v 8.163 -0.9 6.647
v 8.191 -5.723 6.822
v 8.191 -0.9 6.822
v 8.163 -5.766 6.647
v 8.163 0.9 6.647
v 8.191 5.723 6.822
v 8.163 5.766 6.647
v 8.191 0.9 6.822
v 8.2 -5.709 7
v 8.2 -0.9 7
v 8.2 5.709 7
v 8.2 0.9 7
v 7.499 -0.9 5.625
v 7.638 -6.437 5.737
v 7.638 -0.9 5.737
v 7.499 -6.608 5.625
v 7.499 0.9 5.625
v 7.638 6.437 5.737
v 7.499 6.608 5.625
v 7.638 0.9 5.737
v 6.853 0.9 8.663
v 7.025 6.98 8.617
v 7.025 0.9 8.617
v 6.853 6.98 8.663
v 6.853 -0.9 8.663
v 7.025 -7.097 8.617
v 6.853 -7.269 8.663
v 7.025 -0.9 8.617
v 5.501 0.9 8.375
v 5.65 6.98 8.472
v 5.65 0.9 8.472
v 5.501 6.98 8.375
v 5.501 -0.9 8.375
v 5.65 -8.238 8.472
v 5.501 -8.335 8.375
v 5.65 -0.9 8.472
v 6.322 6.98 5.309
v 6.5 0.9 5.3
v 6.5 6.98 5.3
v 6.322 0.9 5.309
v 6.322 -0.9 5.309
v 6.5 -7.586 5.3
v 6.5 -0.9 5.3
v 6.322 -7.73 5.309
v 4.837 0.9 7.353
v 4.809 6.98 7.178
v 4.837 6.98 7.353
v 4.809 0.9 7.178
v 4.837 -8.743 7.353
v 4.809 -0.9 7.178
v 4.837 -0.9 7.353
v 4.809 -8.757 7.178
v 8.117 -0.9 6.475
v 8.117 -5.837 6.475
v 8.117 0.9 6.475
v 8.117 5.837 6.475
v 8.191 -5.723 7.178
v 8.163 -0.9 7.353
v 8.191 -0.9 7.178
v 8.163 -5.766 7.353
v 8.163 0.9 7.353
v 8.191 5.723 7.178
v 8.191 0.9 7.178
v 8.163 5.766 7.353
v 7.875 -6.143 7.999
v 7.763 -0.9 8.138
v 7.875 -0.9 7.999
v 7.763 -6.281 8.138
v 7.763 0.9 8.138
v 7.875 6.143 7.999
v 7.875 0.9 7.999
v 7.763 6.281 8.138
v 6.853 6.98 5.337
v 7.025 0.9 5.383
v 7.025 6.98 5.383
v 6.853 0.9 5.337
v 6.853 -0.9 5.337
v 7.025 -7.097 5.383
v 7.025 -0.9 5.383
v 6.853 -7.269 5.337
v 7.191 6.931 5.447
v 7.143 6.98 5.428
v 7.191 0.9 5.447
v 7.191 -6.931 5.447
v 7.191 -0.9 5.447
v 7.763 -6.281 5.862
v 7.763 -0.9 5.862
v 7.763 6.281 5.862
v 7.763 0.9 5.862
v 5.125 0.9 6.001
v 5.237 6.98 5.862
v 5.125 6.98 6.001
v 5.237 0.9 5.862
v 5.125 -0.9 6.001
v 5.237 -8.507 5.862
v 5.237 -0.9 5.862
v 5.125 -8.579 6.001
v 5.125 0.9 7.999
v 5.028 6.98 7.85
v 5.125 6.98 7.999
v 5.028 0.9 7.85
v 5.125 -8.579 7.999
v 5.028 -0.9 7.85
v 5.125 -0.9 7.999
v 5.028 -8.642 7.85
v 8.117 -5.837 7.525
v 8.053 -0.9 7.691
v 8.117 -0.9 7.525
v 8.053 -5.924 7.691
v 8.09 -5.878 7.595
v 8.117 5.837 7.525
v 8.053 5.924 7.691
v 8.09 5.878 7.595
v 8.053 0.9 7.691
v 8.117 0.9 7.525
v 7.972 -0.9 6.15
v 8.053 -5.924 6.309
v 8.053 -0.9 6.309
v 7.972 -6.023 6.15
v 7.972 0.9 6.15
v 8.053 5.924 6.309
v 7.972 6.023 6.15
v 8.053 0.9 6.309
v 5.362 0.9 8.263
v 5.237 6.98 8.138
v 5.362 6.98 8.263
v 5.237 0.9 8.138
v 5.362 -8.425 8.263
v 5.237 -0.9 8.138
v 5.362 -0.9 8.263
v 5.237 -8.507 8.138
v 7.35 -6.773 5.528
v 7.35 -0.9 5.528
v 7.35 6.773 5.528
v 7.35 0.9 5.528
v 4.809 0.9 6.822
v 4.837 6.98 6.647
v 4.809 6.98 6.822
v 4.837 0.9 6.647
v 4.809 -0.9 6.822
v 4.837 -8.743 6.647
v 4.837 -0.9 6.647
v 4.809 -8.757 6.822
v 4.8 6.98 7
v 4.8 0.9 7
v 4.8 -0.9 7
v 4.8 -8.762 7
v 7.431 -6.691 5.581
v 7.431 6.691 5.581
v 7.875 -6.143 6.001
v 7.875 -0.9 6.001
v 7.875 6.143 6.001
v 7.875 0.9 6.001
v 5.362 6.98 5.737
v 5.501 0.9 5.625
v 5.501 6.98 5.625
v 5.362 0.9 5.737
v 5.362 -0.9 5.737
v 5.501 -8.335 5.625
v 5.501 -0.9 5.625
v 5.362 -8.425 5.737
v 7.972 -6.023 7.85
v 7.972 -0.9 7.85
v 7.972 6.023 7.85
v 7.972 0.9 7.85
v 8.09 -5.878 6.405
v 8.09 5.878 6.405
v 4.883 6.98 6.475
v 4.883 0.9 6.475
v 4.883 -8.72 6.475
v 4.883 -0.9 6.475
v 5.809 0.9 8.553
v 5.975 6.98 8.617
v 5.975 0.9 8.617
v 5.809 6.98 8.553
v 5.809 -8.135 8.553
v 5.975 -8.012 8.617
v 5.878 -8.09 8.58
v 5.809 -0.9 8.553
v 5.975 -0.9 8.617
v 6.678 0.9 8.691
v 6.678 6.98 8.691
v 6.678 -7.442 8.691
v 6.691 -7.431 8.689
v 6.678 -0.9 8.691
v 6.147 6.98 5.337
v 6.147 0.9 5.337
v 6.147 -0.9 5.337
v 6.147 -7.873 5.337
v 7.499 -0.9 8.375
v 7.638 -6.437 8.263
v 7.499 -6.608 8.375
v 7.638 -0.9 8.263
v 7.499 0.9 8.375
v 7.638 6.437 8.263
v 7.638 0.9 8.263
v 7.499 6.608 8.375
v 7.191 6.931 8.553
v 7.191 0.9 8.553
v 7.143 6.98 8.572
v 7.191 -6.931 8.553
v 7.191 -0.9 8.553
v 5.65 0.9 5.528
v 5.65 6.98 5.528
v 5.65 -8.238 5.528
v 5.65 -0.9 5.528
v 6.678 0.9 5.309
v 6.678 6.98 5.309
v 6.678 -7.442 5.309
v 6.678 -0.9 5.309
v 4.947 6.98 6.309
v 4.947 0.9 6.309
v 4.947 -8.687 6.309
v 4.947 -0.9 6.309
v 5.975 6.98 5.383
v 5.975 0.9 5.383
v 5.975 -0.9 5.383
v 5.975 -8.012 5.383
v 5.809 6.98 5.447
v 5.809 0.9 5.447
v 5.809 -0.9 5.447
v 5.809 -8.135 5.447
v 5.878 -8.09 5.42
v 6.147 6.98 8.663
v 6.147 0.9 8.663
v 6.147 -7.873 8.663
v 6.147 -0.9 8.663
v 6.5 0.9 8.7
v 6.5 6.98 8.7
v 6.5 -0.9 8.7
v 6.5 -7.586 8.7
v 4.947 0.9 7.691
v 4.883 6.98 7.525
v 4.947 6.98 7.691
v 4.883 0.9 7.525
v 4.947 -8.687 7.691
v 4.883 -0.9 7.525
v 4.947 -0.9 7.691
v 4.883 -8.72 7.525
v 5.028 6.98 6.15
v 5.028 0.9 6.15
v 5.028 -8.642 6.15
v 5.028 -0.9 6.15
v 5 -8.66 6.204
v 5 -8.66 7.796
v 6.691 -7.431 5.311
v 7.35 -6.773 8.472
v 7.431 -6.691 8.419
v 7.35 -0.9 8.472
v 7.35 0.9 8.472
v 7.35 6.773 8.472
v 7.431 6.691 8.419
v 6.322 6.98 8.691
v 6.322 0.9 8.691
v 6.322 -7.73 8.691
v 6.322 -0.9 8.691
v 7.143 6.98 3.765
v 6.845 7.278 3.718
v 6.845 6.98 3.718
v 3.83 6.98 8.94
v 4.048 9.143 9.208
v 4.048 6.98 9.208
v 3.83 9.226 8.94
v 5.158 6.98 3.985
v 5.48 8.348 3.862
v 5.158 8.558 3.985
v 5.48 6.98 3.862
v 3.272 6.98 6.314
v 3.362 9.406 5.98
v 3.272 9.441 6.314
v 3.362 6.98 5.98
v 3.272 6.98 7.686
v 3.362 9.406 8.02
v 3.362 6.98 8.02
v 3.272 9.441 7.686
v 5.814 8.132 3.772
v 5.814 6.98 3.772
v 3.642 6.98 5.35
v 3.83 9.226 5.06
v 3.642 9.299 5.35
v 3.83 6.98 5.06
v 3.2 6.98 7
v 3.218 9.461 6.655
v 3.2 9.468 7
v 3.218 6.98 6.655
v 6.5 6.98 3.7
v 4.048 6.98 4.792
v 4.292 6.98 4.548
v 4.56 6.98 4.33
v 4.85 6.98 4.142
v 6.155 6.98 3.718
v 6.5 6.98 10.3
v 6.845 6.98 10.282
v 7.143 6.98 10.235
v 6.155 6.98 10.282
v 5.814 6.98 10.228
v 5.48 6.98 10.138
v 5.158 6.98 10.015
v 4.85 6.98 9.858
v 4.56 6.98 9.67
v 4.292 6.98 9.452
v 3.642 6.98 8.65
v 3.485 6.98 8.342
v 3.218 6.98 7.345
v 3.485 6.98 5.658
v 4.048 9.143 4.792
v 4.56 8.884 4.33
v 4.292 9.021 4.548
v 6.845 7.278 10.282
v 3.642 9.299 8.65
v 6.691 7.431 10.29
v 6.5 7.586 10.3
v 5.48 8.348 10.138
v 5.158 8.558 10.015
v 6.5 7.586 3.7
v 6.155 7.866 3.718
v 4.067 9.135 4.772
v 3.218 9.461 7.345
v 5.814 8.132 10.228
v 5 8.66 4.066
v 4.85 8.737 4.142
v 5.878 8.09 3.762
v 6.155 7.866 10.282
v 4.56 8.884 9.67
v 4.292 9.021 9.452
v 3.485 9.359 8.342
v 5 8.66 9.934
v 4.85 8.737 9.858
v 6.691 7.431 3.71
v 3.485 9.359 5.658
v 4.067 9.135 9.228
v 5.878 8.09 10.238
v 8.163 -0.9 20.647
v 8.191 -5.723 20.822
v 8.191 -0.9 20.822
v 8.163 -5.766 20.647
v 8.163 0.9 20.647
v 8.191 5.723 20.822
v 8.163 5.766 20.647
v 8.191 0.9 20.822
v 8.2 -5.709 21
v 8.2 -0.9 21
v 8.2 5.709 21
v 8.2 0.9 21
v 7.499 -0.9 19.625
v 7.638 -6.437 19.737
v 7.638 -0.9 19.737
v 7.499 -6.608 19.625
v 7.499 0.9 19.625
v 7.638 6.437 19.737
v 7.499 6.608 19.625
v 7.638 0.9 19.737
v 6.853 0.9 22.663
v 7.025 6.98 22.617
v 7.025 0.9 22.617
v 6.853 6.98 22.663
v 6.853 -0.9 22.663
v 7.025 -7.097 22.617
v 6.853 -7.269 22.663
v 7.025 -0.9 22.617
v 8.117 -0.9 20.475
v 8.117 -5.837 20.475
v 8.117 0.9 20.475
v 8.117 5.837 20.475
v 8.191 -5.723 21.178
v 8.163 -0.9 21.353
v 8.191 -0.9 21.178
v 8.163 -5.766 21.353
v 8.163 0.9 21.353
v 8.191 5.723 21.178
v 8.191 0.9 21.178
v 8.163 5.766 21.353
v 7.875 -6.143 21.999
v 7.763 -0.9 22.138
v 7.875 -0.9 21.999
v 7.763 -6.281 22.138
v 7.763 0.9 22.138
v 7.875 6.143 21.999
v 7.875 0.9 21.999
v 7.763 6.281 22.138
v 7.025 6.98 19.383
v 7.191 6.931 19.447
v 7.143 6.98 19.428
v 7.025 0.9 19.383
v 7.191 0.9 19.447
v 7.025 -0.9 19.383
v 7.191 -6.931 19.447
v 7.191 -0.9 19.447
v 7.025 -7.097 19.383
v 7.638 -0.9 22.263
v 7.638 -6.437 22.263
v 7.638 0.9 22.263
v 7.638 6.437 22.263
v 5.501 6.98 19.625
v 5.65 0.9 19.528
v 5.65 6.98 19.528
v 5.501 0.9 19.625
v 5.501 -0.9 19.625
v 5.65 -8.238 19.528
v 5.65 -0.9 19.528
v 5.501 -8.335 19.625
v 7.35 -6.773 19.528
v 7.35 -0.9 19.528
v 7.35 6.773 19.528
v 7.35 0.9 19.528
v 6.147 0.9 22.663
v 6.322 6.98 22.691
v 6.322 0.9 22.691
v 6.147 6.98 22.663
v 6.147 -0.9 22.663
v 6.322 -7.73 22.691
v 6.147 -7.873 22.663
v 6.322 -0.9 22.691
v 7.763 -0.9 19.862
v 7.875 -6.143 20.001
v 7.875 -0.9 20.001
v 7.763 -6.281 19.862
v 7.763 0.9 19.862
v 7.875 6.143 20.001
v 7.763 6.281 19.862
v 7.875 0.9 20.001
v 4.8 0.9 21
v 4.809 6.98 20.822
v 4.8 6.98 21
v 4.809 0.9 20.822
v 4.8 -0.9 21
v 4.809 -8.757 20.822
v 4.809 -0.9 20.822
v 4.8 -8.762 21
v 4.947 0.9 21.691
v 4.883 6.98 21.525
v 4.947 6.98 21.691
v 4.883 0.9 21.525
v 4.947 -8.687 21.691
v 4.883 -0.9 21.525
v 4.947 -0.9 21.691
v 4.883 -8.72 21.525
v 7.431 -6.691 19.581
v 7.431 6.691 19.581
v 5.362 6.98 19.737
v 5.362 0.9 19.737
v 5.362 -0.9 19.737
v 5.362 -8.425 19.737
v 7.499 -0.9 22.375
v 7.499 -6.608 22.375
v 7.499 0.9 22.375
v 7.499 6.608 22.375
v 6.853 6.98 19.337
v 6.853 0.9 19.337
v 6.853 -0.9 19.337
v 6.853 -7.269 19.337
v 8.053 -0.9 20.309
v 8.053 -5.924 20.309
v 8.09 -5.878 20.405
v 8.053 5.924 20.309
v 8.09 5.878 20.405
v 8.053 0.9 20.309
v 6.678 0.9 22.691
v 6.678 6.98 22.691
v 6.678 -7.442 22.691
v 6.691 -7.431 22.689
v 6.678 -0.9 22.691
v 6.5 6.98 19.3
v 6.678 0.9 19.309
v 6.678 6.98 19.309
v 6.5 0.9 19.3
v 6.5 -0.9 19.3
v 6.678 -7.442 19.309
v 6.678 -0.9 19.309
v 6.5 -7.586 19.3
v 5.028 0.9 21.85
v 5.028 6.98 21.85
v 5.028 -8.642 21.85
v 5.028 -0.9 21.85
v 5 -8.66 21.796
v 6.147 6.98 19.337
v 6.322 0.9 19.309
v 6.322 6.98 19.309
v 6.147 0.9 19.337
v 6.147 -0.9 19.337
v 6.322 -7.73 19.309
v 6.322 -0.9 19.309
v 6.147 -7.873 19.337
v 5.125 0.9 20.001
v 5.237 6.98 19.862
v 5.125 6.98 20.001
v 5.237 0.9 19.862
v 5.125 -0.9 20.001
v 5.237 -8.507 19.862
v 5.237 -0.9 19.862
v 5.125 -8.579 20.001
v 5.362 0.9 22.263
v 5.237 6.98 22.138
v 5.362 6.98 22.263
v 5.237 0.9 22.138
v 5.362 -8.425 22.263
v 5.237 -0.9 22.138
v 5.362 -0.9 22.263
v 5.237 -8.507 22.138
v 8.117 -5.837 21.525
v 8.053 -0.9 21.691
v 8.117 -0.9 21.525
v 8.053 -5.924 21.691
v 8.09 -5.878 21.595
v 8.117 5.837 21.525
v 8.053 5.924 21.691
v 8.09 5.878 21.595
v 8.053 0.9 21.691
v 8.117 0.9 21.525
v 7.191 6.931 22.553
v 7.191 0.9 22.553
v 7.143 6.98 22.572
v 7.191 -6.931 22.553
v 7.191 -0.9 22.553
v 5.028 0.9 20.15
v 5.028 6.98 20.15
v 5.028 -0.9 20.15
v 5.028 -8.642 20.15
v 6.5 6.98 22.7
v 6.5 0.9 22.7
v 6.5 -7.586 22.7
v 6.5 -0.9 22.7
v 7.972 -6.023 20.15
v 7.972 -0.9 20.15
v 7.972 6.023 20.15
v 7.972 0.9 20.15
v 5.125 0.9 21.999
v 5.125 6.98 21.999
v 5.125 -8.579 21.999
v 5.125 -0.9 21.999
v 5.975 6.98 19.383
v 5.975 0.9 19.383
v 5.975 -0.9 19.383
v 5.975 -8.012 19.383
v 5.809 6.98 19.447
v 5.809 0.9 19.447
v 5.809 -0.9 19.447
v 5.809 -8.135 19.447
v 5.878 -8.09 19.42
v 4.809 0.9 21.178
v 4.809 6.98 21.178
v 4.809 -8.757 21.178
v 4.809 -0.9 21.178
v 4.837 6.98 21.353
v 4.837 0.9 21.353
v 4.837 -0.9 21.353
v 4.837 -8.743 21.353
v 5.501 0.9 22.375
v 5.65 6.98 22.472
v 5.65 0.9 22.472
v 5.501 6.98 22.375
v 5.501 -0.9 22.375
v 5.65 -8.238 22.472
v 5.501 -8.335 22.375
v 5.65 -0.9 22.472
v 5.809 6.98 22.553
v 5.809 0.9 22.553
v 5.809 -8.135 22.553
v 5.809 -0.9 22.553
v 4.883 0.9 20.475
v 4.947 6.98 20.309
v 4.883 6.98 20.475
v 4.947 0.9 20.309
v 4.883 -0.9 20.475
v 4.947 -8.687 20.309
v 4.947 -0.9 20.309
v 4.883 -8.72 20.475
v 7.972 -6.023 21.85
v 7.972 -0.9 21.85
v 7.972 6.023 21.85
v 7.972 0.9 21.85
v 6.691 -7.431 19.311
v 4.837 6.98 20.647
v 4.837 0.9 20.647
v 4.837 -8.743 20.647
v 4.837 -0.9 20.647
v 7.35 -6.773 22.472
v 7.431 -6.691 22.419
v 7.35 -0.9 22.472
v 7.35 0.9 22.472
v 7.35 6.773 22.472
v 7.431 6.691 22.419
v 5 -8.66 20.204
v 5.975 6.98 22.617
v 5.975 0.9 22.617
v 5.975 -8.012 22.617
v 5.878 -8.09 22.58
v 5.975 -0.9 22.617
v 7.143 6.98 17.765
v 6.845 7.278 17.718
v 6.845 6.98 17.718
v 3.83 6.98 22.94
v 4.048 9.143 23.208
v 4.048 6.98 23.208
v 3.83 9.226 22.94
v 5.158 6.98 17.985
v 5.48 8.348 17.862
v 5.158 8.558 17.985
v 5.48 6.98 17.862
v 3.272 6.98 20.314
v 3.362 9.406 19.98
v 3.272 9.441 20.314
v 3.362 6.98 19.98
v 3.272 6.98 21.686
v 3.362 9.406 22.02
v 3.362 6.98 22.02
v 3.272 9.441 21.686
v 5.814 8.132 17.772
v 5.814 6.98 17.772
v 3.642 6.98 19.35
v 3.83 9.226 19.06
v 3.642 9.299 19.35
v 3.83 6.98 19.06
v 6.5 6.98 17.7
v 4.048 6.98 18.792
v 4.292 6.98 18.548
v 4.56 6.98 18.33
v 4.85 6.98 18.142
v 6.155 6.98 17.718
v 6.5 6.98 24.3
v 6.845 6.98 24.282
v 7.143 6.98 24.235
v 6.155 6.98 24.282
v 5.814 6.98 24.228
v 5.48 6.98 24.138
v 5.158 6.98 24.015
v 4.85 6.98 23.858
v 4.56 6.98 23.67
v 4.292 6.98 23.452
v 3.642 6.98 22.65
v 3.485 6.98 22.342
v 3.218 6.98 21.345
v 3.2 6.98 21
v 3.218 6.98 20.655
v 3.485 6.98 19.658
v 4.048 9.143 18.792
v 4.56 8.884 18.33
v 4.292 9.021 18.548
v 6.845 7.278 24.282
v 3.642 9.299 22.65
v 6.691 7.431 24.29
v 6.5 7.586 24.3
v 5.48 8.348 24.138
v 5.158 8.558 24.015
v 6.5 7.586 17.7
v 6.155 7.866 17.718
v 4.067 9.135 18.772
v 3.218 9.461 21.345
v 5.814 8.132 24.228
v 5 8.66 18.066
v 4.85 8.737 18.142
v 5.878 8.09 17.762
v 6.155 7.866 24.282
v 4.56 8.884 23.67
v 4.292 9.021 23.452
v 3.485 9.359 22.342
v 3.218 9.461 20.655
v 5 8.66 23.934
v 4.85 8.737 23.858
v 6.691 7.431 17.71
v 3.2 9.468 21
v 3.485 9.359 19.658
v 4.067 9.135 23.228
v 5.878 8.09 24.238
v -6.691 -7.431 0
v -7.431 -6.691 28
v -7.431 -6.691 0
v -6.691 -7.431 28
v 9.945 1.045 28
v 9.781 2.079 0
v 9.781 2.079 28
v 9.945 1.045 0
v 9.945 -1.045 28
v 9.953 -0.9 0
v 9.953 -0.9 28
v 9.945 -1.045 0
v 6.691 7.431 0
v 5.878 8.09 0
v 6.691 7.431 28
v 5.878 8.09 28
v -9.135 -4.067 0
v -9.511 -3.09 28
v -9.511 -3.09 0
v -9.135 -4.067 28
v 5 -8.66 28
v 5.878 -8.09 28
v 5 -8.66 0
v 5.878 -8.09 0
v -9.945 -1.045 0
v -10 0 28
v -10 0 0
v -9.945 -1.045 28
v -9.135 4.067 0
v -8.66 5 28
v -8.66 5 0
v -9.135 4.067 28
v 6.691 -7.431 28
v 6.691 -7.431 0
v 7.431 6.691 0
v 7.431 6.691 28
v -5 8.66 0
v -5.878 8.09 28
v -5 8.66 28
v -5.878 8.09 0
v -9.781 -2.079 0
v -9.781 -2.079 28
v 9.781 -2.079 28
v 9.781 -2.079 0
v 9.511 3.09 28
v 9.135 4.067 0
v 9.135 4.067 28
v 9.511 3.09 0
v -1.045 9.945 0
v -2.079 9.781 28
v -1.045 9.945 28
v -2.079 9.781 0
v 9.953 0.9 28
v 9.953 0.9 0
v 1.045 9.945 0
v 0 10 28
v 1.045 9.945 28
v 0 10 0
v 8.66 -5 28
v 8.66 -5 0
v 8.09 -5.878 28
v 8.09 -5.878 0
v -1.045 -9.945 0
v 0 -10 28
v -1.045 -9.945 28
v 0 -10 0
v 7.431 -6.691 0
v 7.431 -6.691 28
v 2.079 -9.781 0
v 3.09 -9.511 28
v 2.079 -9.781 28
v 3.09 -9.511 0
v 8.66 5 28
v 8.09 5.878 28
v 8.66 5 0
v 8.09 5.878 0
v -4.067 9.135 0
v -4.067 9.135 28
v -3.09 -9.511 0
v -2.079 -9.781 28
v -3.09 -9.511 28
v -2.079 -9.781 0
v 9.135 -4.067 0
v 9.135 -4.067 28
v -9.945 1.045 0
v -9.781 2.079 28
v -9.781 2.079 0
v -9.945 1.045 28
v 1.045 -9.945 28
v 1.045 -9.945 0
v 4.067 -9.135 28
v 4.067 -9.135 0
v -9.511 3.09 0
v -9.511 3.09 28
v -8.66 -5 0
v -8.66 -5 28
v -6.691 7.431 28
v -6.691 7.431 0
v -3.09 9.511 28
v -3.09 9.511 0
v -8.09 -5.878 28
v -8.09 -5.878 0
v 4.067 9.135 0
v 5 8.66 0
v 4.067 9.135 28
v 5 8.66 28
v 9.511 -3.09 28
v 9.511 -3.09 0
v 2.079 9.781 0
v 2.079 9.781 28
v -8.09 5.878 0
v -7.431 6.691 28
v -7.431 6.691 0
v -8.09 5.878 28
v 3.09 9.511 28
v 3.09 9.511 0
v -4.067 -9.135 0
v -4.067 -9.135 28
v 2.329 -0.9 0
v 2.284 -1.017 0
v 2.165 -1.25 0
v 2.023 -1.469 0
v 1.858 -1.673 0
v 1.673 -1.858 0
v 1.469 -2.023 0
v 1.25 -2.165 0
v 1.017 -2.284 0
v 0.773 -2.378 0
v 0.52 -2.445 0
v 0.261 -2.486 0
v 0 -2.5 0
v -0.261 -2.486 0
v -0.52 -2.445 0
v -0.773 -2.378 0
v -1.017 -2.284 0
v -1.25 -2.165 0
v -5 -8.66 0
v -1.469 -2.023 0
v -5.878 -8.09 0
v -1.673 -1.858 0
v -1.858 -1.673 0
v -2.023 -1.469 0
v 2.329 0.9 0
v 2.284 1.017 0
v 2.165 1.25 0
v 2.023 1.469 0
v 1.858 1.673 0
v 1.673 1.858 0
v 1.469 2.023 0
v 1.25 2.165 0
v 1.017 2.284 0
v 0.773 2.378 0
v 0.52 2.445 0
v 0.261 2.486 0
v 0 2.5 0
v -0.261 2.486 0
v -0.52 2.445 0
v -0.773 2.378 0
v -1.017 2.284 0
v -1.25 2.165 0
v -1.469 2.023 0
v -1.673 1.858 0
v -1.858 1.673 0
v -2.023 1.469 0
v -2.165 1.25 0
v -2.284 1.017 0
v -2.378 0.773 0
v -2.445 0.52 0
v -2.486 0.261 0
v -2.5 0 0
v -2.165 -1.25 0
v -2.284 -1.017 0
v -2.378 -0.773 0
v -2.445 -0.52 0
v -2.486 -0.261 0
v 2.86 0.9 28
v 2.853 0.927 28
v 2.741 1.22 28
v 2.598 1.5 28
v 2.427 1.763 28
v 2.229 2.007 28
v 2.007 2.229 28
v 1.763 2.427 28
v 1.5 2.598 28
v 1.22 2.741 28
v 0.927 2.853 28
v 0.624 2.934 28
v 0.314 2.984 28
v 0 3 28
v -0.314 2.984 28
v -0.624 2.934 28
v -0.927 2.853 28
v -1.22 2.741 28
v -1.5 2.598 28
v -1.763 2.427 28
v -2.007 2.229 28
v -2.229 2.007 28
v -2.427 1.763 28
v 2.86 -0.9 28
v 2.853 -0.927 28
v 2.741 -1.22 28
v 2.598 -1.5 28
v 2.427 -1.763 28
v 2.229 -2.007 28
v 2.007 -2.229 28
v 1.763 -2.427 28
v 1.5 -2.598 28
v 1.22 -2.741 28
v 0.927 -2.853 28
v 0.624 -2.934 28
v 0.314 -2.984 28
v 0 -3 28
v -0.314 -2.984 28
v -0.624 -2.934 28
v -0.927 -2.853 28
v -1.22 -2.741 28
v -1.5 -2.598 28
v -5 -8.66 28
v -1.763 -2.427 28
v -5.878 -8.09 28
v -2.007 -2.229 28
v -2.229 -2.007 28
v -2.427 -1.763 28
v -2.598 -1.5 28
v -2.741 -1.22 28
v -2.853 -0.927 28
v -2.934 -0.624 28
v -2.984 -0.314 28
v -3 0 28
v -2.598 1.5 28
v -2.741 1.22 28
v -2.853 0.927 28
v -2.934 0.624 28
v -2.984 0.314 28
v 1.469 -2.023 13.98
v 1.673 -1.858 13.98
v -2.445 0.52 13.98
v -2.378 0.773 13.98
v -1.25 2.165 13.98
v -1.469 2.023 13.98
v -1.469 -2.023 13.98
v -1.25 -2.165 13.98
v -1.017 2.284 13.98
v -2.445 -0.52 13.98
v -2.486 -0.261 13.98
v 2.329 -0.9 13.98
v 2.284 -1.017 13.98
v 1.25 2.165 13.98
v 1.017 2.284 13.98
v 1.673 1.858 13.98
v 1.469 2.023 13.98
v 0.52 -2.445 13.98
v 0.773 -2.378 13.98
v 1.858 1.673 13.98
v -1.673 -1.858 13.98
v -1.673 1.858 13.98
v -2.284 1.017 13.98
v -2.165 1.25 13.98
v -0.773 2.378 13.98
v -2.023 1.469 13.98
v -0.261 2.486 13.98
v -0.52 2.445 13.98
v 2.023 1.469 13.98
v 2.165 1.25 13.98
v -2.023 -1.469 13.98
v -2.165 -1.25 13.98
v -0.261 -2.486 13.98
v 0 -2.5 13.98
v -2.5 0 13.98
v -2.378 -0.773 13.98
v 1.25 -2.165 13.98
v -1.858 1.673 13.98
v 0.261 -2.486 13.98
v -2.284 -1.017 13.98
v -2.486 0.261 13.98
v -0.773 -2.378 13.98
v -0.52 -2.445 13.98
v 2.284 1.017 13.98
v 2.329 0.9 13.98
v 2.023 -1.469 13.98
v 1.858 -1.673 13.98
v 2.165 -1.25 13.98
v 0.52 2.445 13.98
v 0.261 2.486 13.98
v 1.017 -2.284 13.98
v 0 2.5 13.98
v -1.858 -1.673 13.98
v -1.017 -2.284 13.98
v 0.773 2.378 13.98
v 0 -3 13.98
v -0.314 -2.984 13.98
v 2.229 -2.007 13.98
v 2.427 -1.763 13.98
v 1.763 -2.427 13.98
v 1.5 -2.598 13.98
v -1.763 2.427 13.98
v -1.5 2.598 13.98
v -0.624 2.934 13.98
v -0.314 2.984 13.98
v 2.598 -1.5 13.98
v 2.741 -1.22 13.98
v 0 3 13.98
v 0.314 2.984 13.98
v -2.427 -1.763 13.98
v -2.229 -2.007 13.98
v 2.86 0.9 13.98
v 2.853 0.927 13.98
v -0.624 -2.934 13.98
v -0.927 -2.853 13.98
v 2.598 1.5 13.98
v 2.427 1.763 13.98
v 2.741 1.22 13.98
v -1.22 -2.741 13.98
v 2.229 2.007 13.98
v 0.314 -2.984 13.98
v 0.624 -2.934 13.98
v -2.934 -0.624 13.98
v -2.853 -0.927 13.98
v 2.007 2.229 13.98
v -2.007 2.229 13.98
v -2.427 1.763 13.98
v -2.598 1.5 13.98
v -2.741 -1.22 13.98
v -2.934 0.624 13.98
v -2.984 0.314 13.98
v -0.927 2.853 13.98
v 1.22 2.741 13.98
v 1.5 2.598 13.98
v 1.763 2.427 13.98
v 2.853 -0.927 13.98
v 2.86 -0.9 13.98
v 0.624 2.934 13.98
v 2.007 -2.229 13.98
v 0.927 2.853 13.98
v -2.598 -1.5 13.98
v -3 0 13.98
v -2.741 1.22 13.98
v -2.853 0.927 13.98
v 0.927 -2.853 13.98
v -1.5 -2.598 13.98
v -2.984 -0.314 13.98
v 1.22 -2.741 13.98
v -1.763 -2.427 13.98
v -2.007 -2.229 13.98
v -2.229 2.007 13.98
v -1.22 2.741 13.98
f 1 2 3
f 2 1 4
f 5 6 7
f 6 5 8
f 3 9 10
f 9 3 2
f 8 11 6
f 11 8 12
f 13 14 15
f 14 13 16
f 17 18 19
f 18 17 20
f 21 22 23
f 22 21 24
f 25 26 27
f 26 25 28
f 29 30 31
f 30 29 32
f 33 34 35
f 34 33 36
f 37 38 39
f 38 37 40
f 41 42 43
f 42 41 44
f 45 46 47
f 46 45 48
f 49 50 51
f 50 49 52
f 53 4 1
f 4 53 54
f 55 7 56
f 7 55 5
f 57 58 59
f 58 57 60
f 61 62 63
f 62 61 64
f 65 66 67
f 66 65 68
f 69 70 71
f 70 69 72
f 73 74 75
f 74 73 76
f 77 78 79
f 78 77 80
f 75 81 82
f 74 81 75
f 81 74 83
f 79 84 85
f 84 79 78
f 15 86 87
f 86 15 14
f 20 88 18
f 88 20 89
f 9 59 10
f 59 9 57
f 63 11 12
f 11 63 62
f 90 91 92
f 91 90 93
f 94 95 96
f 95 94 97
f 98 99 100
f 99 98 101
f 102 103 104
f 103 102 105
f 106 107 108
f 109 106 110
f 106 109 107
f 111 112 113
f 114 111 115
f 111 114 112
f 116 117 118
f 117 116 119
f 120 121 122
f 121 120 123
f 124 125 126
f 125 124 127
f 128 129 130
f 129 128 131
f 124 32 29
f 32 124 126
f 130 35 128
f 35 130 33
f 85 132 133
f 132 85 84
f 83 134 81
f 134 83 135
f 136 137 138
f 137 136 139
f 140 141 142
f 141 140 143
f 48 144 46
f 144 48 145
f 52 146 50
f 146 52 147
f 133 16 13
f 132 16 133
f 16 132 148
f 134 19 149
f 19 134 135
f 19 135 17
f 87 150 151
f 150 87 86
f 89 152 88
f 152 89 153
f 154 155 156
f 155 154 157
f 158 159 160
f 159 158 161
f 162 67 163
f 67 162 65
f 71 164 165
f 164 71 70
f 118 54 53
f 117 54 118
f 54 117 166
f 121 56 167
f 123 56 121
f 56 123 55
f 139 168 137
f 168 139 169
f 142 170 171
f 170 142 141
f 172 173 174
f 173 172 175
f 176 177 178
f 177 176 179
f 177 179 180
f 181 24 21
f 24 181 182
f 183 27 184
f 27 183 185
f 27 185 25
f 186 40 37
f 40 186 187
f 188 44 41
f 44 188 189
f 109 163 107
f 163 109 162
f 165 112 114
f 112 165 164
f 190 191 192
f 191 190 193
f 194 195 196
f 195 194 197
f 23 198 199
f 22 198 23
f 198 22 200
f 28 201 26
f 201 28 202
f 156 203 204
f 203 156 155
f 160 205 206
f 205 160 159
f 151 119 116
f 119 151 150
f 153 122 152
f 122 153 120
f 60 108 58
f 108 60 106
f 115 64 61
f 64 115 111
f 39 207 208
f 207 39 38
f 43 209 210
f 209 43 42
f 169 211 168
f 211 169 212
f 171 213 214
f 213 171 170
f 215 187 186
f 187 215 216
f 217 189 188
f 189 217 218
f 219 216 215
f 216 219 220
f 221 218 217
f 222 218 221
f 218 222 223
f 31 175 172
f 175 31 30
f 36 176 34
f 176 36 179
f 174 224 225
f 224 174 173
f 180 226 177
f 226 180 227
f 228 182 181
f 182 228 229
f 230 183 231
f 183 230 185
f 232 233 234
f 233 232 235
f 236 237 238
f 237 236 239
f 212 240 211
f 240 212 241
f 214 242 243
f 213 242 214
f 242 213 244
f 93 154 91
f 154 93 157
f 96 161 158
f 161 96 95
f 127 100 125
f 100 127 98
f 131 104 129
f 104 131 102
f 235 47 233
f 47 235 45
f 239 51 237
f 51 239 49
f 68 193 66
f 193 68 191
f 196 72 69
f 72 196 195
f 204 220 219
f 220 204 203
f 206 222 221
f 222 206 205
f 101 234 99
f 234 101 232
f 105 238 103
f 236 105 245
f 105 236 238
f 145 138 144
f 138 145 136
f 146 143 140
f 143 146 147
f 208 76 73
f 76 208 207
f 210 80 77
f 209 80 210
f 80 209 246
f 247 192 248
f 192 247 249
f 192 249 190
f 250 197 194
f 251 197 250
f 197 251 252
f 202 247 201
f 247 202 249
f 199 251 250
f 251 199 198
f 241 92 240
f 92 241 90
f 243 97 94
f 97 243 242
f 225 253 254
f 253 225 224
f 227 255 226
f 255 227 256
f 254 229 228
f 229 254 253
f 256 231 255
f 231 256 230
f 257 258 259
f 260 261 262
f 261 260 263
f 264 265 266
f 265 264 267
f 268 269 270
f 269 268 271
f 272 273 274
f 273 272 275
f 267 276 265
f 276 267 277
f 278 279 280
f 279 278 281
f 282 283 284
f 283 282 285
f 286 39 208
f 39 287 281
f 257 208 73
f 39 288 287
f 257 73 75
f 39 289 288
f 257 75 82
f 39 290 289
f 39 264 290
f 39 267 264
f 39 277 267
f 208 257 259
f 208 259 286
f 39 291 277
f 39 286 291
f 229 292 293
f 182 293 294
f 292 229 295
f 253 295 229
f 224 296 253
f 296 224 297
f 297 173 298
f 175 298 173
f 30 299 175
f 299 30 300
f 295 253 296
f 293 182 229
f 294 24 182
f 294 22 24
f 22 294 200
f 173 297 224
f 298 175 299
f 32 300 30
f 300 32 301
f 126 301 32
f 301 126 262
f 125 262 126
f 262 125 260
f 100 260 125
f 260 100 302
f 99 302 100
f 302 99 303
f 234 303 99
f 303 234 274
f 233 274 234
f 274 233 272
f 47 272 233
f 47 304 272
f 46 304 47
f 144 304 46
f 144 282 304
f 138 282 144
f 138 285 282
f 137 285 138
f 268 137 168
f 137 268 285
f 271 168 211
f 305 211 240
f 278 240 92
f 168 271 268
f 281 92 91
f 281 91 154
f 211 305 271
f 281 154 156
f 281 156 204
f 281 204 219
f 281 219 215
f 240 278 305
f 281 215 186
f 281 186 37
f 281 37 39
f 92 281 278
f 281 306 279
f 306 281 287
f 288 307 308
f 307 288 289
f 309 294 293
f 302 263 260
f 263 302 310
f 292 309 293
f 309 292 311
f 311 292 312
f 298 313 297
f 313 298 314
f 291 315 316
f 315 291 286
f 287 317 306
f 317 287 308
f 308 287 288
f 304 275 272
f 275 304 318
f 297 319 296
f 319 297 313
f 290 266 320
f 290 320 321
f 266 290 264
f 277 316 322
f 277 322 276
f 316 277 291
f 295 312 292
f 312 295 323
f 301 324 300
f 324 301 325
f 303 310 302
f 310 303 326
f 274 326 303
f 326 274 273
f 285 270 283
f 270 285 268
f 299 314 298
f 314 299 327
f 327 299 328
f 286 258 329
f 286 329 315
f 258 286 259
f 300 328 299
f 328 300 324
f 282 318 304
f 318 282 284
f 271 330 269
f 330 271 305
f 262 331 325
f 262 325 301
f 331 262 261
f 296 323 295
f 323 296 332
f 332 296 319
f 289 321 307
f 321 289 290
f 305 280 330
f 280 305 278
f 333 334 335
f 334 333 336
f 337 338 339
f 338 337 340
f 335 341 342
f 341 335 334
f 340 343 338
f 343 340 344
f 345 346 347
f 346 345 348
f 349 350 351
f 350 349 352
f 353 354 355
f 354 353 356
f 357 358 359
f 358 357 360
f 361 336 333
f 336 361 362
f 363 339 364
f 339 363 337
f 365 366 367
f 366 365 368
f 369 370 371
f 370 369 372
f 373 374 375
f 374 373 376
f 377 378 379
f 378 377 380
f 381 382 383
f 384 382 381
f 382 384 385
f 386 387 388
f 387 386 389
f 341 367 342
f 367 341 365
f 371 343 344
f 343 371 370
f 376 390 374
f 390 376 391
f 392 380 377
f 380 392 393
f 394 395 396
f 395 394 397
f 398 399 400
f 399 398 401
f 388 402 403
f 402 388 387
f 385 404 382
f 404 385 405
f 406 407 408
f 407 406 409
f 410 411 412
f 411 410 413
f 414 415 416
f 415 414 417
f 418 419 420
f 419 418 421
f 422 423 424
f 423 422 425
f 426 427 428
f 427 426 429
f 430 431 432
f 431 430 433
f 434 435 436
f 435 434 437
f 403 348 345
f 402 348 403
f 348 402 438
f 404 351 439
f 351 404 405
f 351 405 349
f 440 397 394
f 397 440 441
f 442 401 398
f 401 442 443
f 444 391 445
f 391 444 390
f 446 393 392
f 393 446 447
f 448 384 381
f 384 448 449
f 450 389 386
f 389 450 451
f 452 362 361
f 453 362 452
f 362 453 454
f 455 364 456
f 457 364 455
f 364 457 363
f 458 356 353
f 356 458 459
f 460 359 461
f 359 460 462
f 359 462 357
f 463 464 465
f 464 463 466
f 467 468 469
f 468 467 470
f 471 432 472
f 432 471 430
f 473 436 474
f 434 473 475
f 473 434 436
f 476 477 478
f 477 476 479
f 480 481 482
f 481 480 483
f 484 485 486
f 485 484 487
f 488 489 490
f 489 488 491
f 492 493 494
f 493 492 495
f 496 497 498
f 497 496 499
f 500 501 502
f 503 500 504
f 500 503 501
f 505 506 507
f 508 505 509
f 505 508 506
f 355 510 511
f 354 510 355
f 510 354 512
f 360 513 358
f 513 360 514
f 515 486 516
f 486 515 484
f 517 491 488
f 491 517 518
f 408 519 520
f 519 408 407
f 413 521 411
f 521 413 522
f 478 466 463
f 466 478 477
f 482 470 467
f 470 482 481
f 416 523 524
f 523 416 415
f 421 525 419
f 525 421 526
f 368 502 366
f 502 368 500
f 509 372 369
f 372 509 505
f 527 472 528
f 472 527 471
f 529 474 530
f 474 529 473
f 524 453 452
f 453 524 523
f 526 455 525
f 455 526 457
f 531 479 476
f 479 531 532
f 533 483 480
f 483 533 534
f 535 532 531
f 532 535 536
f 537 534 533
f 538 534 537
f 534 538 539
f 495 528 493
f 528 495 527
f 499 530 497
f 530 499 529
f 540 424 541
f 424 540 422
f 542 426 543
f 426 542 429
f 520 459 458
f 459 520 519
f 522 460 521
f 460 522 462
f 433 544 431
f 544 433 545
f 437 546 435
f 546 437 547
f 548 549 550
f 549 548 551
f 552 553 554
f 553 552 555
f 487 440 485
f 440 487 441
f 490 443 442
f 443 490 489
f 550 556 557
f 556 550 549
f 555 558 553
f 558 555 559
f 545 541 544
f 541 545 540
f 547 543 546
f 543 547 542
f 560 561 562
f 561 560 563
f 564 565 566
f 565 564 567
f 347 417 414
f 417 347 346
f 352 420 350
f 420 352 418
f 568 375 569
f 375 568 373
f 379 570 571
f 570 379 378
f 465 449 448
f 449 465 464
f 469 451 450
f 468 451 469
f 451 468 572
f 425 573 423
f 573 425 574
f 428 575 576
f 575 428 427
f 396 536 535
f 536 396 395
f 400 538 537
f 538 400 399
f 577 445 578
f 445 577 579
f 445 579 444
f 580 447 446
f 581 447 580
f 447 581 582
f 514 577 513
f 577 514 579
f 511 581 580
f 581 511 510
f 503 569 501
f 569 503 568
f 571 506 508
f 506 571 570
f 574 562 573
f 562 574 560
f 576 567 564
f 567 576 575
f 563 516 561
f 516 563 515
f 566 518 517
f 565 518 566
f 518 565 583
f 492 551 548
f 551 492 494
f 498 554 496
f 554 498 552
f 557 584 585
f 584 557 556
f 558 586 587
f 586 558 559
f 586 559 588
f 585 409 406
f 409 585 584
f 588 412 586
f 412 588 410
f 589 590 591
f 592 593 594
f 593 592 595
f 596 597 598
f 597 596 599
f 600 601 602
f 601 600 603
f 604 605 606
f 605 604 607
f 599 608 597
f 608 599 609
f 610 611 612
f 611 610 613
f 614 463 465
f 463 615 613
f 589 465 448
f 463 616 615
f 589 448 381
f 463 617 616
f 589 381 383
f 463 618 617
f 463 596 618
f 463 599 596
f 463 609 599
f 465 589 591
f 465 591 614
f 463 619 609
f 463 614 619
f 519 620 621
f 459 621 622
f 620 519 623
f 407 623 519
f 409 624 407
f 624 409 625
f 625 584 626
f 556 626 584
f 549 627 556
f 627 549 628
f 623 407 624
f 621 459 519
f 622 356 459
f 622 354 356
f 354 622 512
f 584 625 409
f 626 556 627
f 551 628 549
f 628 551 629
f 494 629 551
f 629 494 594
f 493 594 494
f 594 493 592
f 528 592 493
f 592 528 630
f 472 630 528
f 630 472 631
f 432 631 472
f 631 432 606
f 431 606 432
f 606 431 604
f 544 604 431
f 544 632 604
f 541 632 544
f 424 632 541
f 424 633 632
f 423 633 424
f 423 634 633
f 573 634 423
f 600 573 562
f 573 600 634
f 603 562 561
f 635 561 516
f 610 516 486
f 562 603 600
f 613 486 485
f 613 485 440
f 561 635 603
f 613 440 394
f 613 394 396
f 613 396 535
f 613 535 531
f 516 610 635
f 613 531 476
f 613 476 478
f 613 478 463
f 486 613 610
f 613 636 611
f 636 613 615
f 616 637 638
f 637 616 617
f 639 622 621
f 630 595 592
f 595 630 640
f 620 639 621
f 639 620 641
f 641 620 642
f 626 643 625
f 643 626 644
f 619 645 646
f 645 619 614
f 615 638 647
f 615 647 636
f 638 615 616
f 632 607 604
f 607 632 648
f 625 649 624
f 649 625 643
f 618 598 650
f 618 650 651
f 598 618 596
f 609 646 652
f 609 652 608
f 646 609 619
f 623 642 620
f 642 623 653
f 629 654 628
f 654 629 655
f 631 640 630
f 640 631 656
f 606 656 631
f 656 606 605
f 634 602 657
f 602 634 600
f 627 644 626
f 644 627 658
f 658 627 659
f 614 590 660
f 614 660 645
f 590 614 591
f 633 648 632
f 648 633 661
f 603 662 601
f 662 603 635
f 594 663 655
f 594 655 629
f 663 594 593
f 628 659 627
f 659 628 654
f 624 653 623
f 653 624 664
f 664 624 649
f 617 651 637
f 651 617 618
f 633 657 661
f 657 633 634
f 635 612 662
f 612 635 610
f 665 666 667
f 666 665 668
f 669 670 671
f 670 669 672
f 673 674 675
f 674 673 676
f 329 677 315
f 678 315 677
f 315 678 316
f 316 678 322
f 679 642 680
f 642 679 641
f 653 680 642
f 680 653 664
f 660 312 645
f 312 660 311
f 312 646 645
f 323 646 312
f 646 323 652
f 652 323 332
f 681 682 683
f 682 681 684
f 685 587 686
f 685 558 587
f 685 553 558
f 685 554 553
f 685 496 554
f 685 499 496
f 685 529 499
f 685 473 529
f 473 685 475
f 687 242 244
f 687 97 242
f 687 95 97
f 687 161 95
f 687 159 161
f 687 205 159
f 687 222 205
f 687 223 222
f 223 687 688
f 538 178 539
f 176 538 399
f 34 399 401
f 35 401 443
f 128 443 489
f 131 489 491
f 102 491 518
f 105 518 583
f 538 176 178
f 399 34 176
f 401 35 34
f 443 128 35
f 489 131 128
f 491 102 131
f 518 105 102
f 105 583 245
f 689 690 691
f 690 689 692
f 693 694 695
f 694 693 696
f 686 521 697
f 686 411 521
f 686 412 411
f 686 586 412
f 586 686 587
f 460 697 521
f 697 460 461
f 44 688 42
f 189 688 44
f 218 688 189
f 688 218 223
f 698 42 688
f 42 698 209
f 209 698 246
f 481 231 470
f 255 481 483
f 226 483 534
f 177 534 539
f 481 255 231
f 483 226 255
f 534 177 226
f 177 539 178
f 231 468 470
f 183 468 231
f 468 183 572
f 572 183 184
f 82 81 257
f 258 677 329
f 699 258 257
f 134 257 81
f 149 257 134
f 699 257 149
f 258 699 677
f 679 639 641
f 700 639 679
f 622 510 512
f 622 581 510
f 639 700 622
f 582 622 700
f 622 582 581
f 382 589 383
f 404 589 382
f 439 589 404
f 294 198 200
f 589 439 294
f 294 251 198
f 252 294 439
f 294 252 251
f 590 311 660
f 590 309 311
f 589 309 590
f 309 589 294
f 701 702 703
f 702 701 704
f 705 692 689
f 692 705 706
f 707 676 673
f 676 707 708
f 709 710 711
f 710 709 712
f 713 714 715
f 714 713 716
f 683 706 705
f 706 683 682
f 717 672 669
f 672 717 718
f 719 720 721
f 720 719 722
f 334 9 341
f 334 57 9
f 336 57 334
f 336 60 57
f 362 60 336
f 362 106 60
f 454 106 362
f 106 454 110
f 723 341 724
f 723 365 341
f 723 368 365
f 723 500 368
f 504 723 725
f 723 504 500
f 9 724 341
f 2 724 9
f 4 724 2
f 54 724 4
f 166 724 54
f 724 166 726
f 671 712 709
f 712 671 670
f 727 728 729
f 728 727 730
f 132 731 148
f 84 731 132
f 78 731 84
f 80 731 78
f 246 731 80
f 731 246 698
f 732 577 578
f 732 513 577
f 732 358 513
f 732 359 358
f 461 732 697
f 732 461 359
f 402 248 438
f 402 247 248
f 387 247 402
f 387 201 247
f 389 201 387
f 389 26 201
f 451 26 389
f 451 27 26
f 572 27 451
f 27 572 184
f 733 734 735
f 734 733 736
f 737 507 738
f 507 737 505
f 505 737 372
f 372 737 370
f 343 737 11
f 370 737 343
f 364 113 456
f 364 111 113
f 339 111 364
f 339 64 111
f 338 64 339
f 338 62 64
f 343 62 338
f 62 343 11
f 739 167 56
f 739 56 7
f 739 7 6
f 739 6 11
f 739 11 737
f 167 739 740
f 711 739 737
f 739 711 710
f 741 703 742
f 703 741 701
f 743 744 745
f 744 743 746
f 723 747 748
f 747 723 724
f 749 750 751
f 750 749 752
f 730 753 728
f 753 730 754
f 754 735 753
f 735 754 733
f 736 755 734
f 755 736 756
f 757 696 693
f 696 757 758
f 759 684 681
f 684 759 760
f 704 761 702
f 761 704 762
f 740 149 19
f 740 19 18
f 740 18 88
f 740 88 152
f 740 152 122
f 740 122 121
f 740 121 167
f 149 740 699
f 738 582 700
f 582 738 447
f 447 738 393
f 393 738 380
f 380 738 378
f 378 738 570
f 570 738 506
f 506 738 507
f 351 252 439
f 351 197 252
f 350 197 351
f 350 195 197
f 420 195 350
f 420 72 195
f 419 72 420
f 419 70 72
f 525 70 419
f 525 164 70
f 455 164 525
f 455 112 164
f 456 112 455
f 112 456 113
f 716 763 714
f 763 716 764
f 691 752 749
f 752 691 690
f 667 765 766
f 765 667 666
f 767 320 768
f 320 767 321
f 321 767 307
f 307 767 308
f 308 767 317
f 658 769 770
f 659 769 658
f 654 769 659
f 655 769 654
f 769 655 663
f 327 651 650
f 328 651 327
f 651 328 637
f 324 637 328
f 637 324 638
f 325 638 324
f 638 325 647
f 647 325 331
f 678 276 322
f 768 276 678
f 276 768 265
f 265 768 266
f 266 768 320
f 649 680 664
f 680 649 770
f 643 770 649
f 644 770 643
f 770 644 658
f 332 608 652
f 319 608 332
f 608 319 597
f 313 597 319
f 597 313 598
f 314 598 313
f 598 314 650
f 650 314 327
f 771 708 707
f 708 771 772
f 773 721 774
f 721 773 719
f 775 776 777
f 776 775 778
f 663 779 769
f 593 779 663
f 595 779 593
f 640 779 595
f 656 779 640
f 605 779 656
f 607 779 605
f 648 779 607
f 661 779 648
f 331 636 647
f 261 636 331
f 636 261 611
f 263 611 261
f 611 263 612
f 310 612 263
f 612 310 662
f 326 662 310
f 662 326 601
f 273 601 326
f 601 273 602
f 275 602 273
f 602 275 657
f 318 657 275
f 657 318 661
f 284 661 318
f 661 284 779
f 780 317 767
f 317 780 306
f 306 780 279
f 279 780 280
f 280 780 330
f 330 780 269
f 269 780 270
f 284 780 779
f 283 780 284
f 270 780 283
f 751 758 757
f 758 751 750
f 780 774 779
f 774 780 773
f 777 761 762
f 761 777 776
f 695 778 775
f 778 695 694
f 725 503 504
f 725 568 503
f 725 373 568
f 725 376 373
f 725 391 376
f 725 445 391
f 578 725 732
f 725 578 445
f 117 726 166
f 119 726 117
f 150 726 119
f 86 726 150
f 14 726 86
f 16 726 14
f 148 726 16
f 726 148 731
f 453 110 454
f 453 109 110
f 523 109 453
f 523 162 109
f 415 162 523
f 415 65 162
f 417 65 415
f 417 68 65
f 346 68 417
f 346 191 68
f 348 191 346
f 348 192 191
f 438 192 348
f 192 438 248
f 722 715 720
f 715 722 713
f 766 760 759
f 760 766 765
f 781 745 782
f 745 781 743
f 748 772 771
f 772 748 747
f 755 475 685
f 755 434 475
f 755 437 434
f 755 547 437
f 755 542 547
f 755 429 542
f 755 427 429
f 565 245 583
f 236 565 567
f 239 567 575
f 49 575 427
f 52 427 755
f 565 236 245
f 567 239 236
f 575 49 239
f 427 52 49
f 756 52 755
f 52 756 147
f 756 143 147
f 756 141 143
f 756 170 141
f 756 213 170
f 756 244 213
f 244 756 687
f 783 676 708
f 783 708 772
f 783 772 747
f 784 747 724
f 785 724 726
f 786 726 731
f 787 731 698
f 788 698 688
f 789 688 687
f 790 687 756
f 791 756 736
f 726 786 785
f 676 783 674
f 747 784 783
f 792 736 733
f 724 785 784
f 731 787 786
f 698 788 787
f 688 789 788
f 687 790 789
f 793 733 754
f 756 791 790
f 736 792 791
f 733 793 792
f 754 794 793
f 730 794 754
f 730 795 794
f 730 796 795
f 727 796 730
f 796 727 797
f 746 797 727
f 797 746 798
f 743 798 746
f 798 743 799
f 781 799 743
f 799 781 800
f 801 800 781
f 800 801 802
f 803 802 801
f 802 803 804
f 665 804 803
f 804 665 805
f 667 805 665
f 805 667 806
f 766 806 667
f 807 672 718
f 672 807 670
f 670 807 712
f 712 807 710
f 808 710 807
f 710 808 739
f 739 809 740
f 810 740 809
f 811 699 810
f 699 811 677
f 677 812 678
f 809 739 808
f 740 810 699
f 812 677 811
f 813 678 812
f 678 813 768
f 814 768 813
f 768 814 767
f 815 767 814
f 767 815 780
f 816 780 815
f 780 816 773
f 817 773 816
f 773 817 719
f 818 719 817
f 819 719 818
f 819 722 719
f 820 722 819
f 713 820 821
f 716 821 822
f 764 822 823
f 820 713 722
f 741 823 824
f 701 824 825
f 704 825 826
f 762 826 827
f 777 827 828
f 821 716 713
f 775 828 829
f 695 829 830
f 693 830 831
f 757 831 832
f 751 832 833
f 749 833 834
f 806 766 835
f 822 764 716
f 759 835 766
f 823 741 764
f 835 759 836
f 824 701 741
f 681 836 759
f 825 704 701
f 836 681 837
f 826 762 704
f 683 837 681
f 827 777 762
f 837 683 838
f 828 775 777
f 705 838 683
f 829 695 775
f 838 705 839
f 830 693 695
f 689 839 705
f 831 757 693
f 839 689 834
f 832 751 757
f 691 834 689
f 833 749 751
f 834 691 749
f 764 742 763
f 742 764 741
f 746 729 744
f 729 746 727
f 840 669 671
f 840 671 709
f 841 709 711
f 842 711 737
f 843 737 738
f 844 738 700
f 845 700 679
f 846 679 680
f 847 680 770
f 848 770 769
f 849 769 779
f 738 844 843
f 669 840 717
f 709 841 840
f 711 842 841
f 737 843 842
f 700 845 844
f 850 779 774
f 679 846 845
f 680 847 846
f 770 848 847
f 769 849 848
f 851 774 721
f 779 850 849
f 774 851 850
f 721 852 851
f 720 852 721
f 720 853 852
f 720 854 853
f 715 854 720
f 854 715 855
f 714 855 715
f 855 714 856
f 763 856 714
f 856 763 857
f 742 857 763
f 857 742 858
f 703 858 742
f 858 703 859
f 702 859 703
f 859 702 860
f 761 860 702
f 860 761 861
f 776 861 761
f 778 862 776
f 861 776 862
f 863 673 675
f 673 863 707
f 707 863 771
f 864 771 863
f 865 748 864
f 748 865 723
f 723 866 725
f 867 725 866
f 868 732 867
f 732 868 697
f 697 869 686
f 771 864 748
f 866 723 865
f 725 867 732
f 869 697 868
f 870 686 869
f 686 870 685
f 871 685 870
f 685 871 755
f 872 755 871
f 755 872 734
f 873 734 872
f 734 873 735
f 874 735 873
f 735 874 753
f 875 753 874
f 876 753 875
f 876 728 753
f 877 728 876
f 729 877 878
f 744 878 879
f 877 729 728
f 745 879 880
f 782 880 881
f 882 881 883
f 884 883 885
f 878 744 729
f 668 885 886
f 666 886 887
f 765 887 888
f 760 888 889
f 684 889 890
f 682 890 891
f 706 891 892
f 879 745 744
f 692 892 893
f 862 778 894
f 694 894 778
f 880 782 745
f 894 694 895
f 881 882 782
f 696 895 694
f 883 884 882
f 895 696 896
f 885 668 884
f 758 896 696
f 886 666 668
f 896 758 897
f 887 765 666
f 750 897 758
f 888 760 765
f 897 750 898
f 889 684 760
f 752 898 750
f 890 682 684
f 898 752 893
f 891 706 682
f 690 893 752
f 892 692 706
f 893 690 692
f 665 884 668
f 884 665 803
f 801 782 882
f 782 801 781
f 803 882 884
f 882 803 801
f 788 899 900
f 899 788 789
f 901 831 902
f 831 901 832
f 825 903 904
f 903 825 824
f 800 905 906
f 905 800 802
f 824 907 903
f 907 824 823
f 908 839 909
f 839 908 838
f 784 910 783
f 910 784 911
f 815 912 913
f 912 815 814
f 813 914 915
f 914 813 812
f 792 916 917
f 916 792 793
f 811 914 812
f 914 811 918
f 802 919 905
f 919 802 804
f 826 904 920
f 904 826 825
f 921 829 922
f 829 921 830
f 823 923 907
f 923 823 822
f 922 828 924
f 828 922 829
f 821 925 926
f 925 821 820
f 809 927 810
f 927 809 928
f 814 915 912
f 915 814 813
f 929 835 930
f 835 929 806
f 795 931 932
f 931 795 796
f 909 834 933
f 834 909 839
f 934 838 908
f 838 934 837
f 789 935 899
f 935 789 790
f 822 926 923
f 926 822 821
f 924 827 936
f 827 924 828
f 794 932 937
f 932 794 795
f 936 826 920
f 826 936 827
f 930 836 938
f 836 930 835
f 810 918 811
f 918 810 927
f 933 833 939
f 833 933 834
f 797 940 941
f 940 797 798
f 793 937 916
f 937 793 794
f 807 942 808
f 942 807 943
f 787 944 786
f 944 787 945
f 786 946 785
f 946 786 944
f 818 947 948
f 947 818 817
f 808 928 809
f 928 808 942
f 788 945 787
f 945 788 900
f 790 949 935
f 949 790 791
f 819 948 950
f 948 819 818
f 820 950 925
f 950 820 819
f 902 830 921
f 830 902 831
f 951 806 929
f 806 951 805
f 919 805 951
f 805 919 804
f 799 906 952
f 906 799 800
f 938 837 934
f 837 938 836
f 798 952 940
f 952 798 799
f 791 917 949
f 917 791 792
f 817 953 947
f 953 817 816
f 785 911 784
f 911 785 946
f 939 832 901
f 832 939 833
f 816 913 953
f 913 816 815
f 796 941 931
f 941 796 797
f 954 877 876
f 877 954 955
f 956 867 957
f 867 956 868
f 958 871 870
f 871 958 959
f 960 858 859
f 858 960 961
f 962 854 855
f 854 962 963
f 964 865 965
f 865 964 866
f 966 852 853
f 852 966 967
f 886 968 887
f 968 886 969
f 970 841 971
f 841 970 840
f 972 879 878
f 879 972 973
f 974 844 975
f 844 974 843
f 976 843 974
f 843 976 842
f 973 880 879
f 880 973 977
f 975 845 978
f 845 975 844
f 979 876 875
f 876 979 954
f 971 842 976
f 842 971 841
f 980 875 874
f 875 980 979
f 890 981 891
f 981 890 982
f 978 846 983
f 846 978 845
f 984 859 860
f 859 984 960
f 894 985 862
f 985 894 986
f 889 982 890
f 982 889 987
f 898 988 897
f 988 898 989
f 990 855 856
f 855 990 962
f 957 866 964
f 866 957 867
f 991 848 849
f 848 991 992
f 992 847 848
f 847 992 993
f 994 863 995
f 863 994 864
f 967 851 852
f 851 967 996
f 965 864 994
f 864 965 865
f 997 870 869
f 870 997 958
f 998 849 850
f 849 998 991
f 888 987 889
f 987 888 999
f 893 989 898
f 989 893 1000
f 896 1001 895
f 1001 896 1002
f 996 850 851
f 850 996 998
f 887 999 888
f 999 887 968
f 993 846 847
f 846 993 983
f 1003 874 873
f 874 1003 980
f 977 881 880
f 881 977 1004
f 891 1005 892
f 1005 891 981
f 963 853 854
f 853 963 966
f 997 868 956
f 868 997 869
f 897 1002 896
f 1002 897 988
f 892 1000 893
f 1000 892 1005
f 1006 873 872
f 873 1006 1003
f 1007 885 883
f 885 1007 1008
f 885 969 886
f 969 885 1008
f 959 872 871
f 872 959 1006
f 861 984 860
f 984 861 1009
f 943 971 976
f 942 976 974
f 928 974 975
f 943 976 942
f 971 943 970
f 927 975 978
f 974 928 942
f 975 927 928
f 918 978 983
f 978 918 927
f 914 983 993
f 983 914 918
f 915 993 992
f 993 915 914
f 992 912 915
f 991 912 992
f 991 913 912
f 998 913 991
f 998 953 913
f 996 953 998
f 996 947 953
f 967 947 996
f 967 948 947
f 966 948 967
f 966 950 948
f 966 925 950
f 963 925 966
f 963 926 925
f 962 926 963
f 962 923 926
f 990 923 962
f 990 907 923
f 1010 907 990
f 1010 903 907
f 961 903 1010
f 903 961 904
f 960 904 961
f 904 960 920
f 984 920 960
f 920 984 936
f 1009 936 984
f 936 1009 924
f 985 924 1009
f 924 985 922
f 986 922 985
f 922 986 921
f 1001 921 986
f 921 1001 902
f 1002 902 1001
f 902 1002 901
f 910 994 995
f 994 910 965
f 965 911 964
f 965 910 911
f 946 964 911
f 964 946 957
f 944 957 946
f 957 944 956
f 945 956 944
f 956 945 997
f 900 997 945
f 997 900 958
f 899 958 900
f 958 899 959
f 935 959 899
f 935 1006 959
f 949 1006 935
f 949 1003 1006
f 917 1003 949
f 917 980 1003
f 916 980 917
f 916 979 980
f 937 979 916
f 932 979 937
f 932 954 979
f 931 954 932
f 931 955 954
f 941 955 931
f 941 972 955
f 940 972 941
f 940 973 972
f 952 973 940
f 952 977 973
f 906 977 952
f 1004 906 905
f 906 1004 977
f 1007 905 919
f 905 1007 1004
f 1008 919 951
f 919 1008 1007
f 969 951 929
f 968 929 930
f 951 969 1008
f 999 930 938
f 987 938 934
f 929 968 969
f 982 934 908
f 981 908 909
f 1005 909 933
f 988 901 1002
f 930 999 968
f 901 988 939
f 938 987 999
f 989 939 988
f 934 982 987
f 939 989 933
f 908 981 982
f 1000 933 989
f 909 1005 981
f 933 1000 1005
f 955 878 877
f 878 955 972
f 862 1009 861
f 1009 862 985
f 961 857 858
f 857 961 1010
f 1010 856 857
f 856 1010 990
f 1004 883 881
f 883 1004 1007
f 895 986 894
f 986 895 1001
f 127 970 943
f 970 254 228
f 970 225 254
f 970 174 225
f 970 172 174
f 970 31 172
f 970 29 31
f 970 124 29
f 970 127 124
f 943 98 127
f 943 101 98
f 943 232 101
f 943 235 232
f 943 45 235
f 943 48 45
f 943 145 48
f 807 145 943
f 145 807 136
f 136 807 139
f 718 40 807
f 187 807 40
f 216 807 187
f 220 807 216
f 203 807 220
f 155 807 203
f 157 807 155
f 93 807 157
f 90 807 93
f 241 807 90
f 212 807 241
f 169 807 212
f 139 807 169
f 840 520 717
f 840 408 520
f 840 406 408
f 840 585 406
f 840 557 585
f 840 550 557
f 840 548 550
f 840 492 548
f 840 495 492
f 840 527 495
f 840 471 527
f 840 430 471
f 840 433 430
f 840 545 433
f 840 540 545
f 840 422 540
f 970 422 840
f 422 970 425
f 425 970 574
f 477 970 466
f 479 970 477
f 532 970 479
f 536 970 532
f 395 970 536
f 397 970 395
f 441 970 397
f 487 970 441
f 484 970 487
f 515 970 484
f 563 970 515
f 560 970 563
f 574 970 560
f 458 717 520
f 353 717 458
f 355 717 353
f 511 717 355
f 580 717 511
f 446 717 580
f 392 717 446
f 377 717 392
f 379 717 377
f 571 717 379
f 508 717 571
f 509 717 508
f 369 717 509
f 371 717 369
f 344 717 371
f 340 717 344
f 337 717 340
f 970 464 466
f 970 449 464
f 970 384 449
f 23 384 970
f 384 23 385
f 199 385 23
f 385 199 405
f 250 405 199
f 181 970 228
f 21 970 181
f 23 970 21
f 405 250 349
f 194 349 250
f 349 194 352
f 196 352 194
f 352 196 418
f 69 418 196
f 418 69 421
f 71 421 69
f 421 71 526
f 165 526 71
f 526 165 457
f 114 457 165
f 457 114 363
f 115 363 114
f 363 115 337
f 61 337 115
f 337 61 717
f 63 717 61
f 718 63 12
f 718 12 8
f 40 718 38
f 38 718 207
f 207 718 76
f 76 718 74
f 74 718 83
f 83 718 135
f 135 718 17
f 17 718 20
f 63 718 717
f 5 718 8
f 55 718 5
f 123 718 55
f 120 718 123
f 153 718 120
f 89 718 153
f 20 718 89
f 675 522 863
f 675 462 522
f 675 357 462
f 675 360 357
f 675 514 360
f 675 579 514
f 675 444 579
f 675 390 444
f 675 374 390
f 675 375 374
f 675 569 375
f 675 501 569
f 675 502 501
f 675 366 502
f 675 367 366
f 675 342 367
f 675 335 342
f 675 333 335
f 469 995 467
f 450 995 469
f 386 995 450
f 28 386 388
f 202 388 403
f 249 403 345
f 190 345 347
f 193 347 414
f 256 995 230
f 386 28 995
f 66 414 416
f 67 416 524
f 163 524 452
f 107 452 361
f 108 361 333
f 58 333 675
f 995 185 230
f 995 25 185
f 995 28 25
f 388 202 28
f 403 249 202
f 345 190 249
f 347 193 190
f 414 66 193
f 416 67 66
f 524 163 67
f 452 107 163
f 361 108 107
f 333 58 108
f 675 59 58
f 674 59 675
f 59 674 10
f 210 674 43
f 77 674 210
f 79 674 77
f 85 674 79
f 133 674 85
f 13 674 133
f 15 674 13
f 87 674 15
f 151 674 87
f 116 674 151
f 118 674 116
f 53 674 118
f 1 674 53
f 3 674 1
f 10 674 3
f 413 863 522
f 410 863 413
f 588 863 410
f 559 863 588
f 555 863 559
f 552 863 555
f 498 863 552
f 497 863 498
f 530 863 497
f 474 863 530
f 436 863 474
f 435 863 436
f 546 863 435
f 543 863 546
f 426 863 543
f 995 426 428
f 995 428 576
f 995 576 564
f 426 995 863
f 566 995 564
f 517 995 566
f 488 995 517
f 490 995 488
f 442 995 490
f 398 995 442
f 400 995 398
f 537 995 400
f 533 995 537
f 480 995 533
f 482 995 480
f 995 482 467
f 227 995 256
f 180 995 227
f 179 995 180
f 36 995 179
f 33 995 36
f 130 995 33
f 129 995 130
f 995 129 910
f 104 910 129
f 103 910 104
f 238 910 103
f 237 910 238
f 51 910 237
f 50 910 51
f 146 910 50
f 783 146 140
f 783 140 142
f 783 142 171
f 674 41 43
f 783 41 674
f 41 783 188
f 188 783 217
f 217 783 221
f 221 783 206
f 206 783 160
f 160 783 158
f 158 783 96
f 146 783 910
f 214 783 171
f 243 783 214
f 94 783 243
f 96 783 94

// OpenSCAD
// Split shaft coupling 5 mm to 6 mm.
$fn = 60;
eps = 0.02;
shaft_a = 5;
shaft_b = 6;
outer_d = 20;
length = 28;
slit_w = 1.8;
screw_d = 3.4;
module clamp_hole(z) {
    translate([outer_d / 2 - 3.5, -outer_d / 2 - eps, z]) rotate([-90, 0, 0]) cylinder(d = screw_d, h = outer_d + 2 * eps);
    translate([outer_d / 2 - 3.5, outer_d / 2 - 3 - eps, z]) rotate([-90, 0, 0]) cylinder(d = 6.6, h = 3 + 2 * eps);
}
difference() {
    cylinder(d = outer_d, h = length);
    translate([0, 0, -eps]) cylinder(d = shaft_a, h = length / 2 + eps);
    translate([0, 0, length / 2 - eps]) cylinder(d = shaft_b, h = length / 2 + eps);
    translate([0, -slit_w / 2, -eps]) cube([outer_d / 2 + eps, slit_w, length + 2 * eps]);
    clamp_hole(length / 4);
    clamp_hole(3 * length / 4);
}
